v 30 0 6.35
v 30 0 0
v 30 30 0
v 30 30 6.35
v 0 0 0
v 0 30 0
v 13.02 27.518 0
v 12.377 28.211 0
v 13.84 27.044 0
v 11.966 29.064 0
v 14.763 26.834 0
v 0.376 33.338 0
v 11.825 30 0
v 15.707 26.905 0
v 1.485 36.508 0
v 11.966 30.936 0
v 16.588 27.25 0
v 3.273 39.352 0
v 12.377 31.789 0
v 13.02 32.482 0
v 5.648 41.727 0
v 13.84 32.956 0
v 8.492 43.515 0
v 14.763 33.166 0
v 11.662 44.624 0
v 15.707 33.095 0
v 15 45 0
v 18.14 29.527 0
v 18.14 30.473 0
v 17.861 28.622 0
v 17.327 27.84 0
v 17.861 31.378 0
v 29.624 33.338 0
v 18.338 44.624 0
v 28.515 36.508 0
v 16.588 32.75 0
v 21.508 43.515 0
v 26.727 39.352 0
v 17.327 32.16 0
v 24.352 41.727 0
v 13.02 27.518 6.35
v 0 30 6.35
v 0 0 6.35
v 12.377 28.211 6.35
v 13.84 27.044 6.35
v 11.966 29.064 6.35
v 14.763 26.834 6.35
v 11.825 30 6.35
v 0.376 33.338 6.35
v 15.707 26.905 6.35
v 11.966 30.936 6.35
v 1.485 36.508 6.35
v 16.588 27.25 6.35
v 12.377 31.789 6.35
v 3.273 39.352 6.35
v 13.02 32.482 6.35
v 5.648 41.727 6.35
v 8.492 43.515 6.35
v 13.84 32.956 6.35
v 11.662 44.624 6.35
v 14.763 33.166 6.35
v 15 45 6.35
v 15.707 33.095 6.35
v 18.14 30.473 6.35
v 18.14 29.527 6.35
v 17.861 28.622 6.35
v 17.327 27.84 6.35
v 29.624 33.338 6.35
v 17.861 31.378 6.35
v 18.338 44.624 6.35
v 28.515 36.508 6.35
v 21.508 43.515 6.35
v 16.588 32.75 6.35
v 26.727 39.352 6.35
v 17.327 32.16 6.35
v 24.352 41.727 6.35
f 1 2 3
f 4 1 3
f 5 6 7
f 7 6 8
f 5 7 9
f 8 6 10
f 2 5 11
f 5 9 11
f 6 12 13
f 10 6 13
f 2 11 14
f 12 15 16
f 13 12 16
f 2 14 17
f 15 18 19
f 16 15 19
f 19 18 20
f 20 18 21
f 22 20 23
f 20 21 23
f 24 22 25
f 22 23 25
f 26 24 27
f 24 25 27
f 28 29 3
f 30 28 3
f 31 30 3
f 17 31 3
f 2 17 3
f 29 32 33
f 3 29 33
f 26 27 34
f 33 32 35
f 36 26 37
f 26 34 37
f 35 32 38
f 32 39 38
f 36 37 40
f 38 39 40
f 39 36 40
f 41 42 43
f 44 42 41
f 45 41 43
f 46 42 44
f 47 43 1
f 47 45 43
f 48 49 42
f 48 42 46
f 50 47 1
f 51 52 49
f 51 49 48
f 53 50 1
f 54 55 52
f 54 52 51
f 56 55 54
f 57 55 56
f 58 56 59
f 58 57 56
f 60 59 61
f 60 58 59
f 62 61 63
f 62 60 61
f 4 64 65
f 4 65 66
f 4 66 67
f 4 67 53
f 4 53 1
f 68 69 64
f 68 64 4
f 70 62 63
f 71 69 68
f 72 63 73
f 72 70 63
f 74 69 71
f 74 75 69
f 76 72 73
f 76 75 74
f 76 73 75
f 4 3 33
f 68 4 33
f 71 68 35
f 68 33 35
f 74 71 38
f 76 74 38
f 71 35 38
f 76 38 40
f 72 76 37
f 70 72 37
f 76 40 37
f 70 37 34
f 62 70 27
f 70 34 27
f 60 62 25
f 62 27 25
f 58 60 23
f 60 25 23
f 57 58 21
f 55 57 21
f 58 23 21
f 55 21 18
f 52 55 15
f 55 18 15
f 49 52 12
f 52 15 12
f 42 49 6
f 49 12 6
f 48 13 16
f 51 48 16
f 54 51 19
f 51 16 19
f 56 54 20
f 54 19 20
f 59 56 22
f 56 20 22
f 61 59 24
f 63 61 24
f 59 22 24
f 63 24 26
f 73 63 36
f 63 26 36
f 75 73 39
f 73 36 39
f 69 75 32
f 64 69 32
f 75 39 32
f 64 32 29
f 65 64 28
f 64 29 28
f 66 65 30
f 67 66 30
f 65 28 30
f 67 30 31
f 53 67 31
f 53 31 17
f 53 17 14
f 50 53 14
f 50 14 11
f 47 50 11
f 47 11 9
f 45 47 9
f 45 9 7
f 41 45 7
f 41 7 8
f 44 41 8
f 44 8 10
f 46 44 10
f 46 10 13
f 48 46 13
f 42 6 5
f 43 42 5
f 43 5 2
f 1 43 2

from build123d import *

# Parameters (mm, degrees)
MAIN_SHAPE_DEPTH                = 6.35
F_1_4_0_25_DIAMETER_HOLE1_D     = 6.35
F_1_4_0_25_DIAMETER_HOLE1_DEPTH = 18
F_1_4_0_25_DIAMETER_HOLE1_TIP   = 1.907732465


with BuildPart() as part:
    # Sketch1 → main shape (new body)
    with BuildSketch(Plane.XY):
        with BuildLine():
            Line((0, 0), (30, 0))
            Line((30, 0), (30, 30))
            ThreePointArc((30, 30), (15, 45), (0, 30))
            Line((0, 30), (0, 0))
        make_face()
    extrude(amount=MAIN_SHAPE_DEPTH)

    # 1/4 (0.25) Diameter Hole1
    with Locations(Plane.XY.offset(6.35)):
        with Locations((15, 30)):
            Hole(F_1_4_0_25_DIAMETER_HOLE1_D / 2, depth=F_1_4_0_25_DIAMETER_HOLE1_DEPTH)
            with Locations((0, 0, -(F_1_4_0_25_DIAMETER_HOLE1_DEPTH + F_1_4_0_25_DIAMETER_HOLE1_TIP / 2))):  # 118° drill point
                Cone(0, F_1_4_0_25_DIAMETER_HOLE1_D / 2, F_1_4_0_25_DIAMETER_HOLE1_TIP, mode=Mode.SUBTRACT)


solid = part.part
